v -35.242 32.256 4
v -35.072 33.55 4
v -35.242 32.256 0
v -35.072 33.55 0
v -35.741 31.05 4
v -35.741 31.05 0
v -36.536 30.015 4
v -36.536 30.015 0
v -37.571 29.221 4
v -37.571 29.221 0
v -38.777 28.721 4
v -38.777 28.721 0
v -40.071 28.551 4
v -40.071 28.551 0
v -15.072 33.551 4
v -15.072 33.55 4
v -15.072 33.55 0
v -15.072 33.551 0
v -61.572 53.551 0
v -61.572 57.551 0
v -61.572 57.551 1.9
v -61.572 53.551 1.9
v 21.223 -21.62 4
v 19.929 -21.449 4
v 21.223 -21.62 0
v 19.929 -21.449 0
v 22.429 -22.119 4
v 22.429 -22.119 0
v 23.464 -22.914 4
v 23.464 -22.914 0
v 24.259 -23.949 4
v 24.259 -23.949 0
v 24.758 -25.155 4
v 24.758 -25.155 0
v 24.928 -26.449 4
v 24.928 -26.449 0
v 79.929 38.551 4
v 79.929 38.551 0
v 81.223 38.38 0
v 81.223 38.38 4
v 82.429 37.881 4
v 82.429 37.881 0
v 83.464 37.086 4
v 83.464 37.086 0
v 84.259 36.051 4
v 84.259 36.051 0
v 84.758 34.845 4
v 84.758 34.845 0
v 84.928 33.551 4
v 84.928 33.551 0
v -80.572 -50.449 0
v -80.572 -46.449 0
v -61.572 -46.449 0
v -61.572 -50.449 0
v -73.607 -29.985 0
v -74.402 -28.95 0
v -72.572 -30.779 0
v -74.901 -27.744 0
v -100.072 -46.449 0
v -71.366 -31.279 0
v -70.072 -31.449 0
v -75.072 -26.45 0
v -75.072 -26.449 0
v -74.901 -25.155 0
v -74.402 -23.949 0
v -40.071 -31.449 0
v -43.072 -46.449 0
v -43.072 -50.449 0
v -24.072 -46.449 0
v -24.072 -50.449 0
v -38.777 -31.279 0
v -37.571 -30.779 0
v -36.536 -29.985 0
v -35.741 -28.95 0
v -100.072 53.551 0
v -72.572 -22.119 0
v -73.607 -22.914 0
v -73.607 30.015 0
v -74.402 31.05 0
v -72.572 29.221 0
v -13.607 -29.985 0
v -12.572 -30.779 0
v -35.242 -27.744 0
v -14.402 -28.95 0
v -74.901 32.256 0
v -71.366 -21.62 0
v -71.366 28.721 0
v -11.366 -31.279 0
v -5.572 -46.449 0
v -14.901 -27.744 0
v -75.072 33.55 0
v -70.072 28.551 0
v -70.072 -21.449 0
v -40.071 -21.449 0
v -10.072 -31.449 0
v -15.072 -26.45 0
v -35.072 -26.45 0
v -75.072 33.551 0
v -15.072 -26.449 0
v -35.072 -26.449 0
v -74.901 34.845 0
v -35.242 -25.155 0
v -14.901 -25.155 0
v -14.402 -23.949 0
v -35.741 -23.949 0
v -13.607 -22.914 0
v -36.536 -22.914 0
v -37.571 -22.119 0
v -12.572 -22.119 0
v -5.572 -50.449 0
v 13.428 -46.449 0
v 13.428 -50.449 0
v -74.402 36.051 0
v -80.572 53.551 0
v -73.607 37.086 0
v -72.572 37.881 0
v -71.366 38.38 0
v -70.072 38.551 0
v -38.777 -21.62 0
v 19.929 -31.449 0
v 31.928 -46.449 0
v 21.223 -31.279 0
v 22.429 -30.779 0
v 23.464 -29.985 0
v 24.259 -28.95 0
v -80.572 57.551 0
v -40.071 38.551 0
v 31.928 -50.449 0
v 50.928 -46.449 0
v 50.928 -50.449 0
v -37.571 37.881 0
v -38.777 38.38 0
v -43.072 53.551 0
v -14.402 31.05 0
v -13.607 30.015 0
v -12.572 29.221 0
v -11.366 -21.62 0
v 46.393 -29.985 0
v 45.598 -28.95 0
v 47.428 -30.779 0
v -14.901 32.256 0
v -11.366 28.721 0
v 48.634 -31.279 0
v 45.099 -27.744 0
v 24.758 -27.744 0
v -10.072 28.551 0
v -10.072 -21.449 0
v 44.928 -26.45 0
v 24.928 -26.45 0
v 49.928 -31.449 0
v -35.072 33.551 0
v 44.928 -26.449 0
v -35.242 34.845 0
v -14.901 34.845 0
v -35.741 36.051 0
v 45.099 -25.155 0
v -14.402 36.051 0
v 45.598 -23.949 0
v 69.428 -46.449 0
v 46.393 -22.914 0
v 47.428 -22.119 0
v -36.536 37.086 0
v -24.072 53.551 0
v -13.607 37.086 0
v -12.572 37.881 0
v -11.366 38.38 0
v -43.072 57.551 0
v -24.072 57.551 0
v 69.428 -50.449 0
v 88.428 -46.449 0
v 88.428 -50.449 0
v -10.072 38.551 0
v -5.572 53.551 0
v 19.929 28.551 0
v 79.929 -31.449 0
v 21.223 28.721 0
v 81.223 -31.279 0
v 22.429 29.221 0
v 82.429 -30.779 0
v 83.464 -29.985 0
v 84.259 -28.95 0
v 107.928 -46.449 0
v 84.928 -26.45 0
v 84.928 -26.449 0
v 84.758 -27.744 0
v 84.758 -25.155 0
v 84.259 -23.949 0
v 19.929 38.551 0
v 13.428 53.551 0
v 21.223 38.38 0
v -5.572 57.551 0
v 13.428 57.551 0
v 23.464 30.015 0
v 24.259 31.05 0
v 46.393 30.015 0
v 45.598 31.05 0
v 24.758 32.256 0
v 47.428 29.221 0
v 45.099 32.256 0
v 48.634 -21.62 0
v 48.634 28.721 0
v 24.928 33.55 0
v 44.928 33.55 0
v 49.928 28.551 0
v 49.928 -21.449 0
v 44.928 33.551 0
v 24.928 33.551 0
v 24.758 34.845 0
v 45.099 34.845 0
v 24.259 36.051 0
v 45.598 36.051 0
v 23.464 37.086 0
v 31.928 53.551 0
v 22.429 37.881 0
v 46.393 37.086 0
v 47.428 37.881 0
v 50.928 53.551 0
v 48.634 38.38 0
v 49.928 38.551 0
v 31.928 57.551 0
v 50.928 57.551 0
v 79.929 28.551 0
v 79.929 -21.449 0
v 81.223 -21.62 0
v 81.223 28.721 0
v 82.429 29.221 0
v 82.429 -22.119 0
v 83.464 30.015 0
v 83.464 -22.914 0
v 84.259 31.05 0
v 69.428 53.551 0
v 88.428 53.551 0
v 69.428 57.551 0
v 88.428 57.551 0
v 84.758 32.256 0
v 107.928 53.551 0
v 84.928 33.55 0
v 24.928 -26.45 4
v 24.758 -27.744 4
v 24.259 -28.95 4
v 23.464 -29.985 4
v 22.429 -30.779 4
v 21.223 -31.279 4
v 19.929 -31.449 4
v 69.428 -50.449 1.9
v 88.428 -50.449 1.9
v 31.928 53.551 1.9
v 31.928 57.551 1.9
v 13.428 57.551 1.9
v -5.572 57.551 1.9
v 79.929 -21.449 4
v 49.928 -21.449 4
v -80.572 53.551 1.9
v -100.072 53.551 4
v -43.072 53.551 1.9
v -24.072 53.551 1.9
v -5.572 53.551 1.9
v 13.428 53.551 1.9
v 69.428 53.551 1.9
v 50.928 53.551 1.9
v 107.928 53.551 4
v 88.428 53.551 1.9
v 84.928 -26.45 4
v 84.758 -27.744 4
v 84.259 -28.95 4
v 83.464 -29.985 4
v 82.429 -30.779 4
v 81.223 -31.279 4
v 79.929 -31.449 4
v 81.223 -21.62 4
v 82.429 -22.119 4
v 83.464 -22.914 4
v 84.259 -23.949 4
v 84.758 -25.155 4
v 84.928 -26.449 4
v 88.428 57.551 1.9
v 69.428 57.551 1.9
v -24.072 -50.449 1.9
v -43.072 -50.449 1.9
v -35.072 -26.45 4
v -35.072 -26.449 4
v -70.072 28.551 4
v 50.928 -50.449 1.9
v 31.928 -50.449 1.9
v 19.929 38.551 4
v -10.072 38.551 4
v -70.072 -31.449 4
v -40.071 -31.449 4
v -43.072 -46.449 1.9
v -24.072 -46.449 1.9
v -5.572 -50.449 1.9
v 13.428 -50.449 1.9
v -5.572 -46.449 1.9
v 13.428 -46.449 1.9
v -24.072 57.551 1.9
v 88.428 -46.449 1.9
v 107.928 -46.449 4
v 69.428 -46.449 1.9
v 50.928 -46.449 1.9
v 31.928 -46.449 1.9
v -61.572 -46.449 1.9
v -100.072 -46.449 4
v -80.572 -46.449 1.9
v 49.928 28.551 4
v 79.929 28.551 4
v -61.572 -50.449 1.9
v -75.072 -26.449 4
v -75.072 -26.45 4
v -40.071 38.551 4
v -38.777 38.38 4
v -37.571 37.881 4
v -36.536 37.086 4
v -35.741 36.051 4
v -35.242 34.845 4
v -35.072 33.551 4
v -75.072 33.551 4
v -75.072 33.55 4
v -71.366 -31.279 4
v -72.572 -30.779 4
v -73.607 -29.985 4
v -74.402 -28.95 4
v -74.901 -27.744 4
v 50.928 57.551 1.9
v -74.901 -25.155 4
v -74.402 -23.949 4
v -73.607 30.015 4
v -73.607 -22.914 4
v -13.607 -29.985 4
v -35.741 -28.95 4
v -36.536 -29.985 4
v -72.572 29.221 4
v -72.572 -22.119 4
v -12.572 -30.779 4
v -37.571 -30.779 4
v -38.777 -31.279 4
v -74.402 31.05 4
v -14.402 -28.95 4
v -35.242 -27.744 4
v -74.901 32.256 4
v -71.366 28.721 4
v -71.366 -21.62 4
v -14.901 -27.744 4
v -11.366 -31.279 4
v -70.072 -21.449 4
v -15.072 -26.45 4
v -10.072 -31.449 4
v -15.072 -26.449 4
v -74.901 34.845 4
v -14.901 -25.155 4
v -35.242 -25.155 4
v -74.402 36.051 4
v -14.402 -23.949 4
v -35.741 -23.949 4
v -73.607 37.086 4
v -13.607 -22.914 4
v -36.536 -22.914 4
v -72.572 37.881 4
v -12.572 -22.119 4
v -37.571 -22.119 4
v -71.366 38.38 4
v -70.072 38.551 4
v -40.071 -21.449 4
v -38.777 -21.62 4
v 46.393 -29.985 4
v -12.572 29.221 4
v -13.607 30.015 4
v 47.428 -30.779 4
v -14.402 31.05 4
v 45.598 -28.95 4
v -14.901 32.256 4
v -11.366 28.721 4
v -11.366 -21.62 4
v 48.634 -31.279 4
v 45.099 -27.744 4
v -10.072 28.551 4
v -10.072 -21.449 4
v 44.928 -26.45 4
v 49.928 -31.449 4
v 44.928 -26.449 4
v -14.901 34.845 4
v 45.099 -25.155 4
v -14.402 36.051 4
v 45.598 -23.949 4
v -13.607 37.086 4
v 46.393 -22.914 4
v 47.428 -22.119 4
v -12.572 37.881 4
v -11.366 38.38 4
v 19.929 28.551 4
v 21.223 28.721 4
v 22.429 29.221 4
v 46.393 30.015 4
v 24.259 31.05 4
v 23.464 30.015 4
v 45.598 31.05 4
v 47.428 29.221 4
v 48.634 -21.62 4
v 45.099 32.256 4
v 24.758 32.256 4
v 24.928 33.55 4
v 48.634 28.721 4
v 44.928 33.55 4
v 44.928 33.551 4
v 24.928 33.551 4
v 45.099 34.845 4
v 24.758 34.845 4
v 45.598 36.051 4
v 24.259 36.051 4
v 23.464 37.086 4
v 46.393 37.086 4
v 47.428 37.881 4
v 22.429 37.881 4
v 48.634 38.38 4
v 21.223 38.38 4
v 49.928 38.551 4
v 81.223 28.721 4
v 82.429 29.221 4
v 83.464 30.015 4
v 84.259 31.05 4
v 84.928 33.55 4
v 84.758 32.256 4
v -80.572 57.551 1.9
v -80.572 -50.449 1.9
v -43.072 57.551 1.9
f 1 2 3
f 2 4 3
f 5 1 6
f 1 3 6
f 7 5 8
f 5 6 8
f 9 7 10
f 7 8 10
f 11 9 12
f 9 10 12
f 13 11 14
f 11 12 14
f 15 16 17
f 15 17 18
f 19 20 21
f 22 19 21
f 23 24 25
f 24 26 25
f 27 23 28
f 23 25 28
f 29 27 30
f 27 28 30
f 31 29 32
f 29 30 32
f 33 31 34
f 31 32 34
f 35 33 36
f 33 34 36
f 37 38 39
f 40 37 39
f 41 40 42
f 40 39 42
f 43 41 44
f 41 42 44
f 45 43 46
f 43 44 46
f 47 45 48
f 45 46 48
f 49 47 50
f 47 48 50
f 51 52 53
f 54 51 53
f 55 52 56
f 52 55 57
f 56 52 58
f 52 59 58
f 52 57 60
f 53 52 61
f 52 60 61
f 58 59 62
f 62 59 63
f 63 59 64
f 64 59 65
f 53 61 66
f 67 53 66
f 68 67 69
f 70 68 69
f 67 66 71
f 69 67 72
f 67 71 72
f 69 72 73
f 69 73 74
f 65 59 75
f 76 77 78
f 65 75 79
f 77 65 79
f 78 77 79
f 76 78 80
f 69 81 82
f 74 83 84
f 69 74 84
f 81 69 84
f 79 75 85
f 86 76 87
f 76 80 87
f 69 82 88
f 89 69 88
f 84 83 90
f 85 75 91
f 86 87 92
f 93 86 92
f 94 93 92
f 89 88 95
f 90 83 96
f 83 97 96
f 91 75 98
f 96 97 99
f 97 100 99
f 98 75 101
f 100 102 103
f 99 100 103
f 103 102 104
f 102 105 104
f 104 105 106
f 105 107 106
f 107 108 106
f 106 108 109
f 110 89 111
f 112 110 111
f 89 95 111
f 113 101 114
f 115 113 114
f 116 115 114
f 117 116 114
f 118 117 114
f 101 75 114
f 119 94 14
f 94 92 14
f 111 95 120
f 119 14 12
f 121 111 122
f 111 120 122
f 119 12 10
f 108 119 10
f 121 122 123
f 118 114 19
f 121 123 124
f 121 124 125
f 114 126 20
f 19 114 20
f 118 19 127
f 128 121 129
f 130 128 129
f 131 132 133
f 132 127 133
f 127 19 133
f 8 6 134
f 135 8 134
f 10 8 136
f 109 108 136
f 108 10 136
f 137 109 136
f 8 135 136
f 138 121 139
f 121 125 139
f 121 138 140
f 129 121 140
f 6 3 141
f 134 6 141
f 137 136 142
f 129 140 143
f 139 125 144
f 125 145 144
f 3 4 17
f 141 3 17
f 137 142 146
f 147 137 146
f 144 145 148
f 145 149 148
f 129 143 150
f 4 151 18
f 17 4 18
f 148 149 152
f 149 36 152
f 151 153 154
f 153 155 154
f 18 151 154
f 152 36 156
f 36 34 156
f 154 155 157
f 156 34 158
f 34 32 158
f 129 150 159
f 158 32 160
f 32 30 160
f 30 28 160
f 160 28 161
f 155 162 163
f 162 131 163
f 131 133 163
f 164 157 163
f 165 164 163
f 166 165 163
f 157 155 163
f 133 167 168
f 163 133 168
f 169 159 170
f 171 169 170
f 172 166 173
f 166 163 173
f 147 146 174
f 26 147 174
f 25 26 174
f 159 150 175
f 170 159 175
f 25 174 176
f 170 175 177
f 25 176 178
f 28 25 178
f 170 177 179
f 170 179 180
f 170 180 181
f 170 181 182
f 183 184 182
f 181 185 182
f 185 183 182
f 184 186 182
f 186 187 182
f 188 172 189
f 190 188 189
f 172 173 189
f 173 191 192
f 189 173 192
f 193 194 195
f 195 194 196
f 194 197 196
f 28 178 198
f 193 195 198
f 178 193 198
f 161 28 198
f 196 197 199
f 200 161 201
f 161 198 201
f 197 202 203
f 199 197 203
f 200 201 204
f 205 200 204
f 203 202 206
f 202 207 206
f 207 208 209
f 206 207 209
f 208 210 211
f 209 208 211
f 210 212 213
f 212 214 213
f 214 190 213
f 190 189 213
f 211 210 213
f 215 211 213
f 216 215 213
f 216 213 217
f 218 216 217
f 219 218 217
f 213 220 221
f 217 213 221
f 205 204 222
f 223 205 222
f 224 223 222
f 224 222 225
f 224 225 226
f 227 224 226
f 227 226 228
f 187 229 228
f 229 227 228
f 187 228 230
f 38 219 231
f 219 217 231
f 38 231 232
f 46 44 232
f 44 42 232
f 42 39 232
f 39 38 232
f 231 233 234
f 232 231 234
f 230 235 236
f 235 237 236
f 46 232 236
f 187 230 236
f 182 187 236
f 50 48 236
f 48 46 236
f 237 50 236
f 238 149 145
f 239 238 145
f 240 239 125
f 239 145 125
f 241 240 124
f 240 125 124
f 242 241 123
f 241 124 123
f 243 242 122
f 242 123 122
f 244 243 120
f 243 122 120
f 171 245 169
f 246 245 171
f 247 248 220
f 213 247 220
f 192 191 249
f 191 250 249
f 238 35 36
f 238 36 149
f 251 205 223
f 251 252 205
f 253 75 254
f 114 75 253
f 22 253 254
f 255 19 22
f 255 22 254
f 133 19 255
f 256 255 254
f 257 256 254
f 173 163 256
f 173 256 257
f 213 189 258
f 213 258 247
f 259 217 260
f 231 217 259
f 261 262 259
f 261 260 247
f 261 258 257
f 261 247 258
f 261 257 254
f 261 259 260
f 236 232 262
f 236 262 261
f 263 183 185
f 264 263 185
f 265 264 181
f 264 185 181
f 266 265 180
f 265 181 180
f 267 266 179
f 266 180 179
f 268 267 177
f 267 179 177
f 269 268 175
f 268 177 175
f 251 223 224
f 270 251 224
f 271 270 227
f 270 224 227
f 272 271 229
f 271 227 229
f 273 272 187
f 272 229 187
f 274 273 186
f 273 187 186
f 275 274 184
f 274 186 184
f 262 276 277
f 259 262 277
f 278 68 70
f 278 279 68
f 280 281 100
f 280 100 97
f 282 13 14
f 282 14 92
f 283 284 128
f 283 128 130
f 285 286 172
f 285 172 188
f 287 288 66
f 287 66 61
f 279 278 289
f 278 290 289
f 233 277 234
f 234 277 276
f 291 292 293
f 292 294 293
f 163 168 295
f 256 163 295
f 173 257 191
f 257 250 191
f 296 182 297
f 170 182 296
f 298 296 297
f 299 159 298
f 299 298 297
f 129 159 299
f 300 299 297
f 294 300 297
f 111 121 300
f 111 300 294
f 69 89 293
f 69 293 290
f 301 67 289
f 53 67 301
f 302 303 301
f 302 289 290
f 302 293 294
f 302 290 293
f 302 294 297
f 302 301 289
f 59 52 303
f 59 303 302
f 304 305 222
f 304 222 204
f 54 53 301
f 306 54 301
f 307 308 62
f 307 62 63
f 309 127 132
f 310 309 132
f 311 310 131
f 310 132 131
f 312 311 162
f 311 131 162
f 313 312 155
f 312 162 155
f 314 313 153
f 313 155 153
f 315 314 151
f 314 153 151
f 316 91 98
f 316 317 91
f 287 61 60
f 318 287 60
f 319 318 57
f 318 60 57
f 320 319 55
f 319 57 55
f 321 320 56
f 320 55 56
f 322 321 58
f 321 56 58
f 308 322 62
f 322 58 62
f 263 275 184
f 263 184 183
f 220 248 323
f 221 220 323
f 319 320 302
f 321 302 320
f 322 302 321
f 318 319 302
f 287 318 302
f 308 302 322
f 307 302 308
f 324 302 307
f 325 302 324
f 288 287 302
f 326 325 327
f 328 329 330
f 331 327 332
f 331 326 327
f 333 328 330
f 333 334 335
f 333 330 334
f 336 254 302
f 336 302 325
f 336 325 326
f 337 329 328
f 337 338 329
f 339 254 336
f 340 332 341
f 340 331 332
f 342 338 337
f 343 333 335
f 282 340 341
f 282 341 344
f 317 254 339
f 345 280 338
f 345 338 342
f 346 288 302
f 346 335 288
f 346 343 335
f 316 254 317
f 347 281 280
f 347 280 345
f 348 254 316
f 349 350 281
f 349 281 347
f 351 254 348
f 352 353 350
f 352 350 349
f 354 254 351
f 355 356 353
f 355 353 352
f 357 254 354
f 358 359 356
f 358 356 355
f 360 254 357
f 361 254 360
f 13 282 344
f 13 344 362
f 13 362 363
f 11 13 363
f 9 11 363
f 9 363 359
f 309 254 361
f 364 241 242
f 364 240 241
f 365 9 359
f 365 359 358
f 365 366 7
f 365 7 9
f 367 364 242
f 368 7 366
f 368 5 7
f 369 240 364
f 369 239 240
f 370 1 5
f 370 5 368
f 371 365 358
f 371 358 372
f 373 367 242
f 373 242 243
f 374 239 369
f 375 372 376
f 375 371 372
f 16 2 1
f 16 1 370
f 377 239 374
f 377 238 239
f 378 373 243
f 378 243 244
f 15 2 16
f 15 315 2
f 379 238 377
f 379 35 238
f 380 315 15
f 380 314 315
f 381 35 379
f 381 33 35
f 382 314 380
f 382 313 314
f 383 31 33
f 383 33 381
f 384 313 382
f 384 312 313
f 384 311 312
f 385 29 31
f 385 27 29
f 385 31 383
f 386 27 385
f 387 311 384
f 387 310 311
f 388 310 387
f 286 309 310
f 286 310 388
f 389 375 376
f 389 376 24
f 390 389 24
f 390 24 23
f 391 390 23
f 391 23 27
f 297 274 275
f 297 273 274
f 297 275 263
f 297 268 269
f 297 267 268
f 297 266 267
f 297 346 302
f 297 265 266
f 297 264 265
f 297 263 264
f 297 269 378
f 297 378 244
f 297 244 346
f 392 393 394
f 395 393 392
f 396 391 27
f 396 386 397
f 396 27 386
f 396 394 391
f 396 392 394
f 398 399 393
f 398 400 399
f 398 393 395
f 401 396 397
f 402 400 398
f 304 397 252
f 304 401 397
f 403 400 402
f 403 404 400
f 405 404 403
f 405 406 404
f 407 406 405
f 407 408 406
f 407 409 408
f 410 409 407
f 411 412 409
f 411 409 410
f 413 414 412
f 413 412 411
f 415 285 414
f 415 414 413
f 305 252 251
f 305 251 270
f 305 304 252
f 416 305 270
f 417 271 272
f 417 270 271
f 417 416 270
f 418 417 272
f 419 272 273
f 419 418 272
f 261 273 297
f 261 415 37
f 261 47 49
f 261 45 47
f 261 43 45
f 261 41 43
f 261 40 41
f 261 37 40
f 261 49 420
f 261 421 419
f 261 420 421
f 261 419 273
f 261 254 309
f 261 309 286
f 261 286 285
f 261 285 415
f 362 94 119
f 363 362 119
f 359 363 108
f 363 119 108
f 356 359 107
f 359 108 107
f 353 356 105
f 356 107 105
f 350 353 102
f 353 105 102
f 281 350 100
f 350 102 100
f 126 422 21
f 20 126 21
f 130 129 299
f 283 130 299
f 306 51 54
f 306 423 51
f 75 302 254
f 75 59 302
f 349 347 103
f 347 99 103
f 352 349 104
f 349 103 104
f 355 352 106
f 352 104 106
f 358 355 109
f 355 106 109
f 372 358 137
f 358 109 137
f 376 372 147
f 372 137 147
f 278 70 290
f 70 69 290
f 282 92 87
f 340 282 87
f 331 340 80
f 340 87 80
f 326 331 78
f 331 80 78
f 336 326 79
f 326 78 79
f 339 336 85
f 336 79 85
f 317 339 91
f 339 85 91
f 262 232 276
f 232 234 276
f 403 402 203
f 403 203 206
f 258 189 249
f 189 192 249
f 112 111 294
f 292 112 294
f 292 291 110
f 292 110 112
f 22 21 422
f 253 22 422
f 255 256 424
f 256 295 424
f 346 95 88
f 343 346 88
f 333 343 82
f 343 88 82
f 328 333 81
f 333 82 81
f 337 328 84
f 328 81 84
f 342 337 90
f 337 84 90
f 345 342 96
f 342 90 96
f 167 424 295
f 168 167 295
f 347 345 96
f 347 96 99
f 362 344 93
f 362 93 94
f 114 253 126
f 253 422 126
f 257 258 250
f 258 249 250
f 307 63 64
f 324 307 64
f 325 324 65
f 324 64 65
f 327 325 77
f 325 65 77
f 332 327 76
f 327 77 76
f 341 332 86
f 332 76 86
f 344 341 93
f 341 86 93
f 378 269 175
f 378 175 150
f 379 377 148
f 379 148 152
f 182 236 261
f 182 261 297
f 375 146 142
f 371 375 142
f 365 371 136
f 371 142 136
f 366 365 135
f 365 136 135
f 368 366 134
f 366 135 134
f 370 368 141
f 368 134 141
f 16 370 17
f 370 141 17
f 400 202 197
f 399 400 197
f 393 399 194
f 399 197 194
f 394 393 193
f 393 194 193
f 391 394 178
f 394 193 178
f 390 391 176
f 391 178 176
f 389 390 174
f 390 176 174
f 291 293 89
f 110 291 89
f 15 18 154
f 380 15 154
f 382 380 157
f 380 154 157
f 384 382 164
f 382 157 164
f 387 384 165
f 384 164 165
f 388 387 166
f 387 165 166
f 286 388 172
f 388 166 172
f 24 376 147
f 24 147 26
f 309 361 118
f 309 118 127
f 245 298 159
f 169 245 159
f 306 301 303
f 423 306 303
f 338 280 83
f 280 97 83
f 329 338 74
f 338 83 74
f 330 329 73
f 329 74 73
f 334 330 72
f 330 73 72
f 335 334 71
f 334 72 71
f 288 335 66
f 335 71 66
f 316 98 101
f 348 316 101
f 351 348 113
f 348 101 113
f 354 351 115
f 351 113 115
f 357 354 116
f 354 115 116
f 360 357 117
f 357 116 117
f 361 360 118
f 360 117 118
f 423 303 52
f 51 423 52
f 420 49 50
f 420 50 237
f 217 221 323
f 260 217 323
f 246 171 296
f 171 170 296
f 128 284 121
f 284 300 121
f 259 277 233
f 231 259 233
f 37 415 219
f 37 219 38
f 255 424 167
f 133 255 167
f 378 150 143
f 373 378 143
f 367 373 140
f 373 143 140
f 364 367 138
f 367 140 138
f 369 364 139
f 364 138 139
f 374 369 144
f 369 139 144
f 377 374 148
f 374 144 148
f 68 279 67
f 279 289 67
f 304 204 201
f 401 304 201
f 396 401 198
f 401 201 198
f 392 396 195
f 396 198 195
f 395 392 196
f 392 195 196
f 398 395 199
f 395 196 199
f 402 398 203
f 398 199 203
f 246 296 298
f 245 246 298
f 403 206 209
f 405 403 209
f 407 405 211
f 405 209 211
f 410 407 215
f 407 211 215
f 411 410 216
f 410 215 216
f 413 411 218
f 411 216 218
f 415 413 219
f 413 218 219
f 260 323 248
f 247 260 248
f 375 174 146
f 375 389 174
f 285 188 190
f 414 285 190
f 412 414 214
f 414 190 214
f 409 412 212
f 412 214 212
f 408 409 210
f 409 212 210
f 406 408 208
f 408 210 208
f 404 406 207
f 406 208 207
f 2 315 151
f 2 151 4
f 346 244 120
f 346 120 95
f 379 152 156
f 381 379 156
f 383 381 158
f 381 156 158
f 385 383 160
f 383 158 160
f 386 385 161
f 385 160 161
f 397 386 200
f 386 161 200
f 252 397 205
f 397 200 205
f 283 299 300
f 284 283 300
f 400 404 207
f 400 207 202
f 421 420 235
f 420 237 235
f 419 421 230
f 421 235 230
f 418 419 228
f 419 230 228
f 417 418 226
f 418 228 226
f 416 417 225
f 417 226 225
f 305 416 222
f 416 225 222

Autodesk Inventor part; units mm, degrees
ref_plane "YZ Plane" through (0, 0, 0) normal (1, 0, 0) x (0, 1, 0)
ref_plane "XZ Plane" through (0, 0, 0) normal (0, 1, 0) x (-1, 0, 0)
ref_plane "XY Plane" through (0, 0, 0) normal (0, 0, 1) x (1, 0, 0)
sketch "Sketch1" plane through (0, 0, 0) normal (0, 0, 1) x (1, 0, 0)
  line L0 (-100.0716, 53.5507) -> (107.9284, 53.5507)
  line L1 (107.9284, 53.5507) -> (107.9284, -46.4493)
  line L2 (107.9284, -46.4493) -> (-100.0716, -46.4493)
  line L3 (-100.0716, -46.4493) -> (-100.0716, 53.5507)
  point P0 (0, 0)
  dimension "d0" = 208
  dimension "d1" = 100
extrude "Extrusion1" add sketch "Sketch1" along normal blind 4
sketch "Sketch2" plane through (-100.0716, -46.4493, 0) normal (0, -1, 0) x (1, 0, 0)
  line L0 (0, 0) -> (208, 0) projected
  line L1 (19.5, 0) -> (38.5, 0)
  line L2 (38.5, 0) -> (38.5, 1.9)
  line L3 (38.5, 1.9) -> (19.5, 1.9)
  line L4 (19.5, 1.9) -> (19.5, 0)
  line L5 (0, 0) -> (0, 4) projected
  point P0 (100.0716, 0)
  point P1 (19.5, 0.95)
  dimension "d4" = 19
  dimension "d5" = 1.9
  dimension "d6" = 19.5
extrude "Extrusion2" add sketch "Sketch2" along normal blind 4
pattern_linear "Rectangular Pattern1" count 5 spacing 37.5 along (1, 0, 0) count 2 spacing 104 along (0, 1, 0) of "Extrusion2"
sketch "Sketch3" plane through (0, 0, 4) normal (0, 0, 1) x (1, 0, 0)
  line L0 (89.7284, -20.8493) -> (97.9284, -20.8493)
  line L1 (97.9284, -20.8493) -> (97.9284, -36.4493)
  line L2 (97.9284, -36.4493) -> (89.7284, -36.4493)
  line L3 (89.7284, -36.4493) -> (89.7284, -20.8493)
  line L4 (107.9284, 53.5507) -> (-100.0716, 53.5507) projected
  line L5 (-100.0716, 53.5507) -> (-100.0716, -46.4493) projected
  line L6 (107.9284, -46.4493) -> (107.9284, 53.5507) projected
  line L7 (-100.0716, -46.4493) -> (107.9284, -46.4493) projected
  point P0 (0, 0)
  dimension "d15" = 8.2
  dimension "d16" = 15.6
  dimension "d21" = 10
  dimension "d22" = 10
extrude "Extrusion3" [suppressed]
sketch "Sketch4" plane through (0, 0, 4) normal (0, 0, 1) x (1, 0, 0)
  line L0 (-75.0716, 38.5507) -> (-35.0716, 38.5507)
  line L1 (-35.0716, 38.5507) -> (-35.0716, 28.5507)
  line L2 (-35.0716, 28.5507) -> (-75.0716, 28.5507)
  line L3 (-75.0716, 28.5507) -> (-75.0716, 38.5507)
  line L4 (-15.0716, 38.5507) -> (24.9284, 38.5507)
  line L5 (24.9284, 38.5507) -> (24.9284, 28.5507)
  line L6 (24.9284, 28.5507) -> (-15.0716, 28.5507)
  line L7 (-15.0716, 28.5507) -> (-15.0716, 38.5507)
  line L8 (44.9284, 38.5507) -> (84.9284, 38.5507)
  line L9 (84.9284, 38.5507) -> (84.9284, 28.5507)
  line L10 (84.9284, 28.5507) -> (44.9284, 28.5507)
  line L11 (44.9284, 28.5507) -> (44.9284, 38.5507)
  line L12 (-100.0716, 53.5507) -> (-100.0716, -46.4493) projected
  line L13 (107.9284, 53.5507) -> (-100.0716, 53.5507) projected
  point P0 (0, 0)
  point P1 (-75.0716, 33.5507)
  point P2 (-15.0716, 33.5507)
  point P3 (-35.0716, 33.5507)
  point P4 (44.9284, 33.5507)
  point P5 (24.9284, 33.5507)
  dimension "d23" = 40
  dimension "d24" = 10
  dimension "d25" = 40
  dimension "d26" = 10
  dimension "d27" = 40
  dimension "d28" = 10
  dimension "d29" = 25
  dimension "d30" = 20
  dimension "d31" = 20
  dimension "d35" = 15
extrude "Extrusion4" cut sketch "Sketch4" against normal blind 10
fillet "Fillet1" radius 5 12 edges at (-75.0716, 38.5507, 2) (-75.0716, 28.5507, 2) (-35.0716, 28.5507, 2) (-35.0716, 38.5507, 2) (-15.0716, 38.5507, 2) (-15.0716, 28.5507, 2) (24.9284, 38.5507, 2) (24.9284, 28.5507, 2) (44.9284, 38.5507, 2) (44.9284, 28.5507, 2) (84.9284, 38.5507, 2) (84.9284, 28.5507, 2)
pattern_linear "Rectangular Pattern2" count 2 spacing 60 along (0, -1, 0) of "Extrusion4", "Fillet1"
properties part number "Enclosure_2"
